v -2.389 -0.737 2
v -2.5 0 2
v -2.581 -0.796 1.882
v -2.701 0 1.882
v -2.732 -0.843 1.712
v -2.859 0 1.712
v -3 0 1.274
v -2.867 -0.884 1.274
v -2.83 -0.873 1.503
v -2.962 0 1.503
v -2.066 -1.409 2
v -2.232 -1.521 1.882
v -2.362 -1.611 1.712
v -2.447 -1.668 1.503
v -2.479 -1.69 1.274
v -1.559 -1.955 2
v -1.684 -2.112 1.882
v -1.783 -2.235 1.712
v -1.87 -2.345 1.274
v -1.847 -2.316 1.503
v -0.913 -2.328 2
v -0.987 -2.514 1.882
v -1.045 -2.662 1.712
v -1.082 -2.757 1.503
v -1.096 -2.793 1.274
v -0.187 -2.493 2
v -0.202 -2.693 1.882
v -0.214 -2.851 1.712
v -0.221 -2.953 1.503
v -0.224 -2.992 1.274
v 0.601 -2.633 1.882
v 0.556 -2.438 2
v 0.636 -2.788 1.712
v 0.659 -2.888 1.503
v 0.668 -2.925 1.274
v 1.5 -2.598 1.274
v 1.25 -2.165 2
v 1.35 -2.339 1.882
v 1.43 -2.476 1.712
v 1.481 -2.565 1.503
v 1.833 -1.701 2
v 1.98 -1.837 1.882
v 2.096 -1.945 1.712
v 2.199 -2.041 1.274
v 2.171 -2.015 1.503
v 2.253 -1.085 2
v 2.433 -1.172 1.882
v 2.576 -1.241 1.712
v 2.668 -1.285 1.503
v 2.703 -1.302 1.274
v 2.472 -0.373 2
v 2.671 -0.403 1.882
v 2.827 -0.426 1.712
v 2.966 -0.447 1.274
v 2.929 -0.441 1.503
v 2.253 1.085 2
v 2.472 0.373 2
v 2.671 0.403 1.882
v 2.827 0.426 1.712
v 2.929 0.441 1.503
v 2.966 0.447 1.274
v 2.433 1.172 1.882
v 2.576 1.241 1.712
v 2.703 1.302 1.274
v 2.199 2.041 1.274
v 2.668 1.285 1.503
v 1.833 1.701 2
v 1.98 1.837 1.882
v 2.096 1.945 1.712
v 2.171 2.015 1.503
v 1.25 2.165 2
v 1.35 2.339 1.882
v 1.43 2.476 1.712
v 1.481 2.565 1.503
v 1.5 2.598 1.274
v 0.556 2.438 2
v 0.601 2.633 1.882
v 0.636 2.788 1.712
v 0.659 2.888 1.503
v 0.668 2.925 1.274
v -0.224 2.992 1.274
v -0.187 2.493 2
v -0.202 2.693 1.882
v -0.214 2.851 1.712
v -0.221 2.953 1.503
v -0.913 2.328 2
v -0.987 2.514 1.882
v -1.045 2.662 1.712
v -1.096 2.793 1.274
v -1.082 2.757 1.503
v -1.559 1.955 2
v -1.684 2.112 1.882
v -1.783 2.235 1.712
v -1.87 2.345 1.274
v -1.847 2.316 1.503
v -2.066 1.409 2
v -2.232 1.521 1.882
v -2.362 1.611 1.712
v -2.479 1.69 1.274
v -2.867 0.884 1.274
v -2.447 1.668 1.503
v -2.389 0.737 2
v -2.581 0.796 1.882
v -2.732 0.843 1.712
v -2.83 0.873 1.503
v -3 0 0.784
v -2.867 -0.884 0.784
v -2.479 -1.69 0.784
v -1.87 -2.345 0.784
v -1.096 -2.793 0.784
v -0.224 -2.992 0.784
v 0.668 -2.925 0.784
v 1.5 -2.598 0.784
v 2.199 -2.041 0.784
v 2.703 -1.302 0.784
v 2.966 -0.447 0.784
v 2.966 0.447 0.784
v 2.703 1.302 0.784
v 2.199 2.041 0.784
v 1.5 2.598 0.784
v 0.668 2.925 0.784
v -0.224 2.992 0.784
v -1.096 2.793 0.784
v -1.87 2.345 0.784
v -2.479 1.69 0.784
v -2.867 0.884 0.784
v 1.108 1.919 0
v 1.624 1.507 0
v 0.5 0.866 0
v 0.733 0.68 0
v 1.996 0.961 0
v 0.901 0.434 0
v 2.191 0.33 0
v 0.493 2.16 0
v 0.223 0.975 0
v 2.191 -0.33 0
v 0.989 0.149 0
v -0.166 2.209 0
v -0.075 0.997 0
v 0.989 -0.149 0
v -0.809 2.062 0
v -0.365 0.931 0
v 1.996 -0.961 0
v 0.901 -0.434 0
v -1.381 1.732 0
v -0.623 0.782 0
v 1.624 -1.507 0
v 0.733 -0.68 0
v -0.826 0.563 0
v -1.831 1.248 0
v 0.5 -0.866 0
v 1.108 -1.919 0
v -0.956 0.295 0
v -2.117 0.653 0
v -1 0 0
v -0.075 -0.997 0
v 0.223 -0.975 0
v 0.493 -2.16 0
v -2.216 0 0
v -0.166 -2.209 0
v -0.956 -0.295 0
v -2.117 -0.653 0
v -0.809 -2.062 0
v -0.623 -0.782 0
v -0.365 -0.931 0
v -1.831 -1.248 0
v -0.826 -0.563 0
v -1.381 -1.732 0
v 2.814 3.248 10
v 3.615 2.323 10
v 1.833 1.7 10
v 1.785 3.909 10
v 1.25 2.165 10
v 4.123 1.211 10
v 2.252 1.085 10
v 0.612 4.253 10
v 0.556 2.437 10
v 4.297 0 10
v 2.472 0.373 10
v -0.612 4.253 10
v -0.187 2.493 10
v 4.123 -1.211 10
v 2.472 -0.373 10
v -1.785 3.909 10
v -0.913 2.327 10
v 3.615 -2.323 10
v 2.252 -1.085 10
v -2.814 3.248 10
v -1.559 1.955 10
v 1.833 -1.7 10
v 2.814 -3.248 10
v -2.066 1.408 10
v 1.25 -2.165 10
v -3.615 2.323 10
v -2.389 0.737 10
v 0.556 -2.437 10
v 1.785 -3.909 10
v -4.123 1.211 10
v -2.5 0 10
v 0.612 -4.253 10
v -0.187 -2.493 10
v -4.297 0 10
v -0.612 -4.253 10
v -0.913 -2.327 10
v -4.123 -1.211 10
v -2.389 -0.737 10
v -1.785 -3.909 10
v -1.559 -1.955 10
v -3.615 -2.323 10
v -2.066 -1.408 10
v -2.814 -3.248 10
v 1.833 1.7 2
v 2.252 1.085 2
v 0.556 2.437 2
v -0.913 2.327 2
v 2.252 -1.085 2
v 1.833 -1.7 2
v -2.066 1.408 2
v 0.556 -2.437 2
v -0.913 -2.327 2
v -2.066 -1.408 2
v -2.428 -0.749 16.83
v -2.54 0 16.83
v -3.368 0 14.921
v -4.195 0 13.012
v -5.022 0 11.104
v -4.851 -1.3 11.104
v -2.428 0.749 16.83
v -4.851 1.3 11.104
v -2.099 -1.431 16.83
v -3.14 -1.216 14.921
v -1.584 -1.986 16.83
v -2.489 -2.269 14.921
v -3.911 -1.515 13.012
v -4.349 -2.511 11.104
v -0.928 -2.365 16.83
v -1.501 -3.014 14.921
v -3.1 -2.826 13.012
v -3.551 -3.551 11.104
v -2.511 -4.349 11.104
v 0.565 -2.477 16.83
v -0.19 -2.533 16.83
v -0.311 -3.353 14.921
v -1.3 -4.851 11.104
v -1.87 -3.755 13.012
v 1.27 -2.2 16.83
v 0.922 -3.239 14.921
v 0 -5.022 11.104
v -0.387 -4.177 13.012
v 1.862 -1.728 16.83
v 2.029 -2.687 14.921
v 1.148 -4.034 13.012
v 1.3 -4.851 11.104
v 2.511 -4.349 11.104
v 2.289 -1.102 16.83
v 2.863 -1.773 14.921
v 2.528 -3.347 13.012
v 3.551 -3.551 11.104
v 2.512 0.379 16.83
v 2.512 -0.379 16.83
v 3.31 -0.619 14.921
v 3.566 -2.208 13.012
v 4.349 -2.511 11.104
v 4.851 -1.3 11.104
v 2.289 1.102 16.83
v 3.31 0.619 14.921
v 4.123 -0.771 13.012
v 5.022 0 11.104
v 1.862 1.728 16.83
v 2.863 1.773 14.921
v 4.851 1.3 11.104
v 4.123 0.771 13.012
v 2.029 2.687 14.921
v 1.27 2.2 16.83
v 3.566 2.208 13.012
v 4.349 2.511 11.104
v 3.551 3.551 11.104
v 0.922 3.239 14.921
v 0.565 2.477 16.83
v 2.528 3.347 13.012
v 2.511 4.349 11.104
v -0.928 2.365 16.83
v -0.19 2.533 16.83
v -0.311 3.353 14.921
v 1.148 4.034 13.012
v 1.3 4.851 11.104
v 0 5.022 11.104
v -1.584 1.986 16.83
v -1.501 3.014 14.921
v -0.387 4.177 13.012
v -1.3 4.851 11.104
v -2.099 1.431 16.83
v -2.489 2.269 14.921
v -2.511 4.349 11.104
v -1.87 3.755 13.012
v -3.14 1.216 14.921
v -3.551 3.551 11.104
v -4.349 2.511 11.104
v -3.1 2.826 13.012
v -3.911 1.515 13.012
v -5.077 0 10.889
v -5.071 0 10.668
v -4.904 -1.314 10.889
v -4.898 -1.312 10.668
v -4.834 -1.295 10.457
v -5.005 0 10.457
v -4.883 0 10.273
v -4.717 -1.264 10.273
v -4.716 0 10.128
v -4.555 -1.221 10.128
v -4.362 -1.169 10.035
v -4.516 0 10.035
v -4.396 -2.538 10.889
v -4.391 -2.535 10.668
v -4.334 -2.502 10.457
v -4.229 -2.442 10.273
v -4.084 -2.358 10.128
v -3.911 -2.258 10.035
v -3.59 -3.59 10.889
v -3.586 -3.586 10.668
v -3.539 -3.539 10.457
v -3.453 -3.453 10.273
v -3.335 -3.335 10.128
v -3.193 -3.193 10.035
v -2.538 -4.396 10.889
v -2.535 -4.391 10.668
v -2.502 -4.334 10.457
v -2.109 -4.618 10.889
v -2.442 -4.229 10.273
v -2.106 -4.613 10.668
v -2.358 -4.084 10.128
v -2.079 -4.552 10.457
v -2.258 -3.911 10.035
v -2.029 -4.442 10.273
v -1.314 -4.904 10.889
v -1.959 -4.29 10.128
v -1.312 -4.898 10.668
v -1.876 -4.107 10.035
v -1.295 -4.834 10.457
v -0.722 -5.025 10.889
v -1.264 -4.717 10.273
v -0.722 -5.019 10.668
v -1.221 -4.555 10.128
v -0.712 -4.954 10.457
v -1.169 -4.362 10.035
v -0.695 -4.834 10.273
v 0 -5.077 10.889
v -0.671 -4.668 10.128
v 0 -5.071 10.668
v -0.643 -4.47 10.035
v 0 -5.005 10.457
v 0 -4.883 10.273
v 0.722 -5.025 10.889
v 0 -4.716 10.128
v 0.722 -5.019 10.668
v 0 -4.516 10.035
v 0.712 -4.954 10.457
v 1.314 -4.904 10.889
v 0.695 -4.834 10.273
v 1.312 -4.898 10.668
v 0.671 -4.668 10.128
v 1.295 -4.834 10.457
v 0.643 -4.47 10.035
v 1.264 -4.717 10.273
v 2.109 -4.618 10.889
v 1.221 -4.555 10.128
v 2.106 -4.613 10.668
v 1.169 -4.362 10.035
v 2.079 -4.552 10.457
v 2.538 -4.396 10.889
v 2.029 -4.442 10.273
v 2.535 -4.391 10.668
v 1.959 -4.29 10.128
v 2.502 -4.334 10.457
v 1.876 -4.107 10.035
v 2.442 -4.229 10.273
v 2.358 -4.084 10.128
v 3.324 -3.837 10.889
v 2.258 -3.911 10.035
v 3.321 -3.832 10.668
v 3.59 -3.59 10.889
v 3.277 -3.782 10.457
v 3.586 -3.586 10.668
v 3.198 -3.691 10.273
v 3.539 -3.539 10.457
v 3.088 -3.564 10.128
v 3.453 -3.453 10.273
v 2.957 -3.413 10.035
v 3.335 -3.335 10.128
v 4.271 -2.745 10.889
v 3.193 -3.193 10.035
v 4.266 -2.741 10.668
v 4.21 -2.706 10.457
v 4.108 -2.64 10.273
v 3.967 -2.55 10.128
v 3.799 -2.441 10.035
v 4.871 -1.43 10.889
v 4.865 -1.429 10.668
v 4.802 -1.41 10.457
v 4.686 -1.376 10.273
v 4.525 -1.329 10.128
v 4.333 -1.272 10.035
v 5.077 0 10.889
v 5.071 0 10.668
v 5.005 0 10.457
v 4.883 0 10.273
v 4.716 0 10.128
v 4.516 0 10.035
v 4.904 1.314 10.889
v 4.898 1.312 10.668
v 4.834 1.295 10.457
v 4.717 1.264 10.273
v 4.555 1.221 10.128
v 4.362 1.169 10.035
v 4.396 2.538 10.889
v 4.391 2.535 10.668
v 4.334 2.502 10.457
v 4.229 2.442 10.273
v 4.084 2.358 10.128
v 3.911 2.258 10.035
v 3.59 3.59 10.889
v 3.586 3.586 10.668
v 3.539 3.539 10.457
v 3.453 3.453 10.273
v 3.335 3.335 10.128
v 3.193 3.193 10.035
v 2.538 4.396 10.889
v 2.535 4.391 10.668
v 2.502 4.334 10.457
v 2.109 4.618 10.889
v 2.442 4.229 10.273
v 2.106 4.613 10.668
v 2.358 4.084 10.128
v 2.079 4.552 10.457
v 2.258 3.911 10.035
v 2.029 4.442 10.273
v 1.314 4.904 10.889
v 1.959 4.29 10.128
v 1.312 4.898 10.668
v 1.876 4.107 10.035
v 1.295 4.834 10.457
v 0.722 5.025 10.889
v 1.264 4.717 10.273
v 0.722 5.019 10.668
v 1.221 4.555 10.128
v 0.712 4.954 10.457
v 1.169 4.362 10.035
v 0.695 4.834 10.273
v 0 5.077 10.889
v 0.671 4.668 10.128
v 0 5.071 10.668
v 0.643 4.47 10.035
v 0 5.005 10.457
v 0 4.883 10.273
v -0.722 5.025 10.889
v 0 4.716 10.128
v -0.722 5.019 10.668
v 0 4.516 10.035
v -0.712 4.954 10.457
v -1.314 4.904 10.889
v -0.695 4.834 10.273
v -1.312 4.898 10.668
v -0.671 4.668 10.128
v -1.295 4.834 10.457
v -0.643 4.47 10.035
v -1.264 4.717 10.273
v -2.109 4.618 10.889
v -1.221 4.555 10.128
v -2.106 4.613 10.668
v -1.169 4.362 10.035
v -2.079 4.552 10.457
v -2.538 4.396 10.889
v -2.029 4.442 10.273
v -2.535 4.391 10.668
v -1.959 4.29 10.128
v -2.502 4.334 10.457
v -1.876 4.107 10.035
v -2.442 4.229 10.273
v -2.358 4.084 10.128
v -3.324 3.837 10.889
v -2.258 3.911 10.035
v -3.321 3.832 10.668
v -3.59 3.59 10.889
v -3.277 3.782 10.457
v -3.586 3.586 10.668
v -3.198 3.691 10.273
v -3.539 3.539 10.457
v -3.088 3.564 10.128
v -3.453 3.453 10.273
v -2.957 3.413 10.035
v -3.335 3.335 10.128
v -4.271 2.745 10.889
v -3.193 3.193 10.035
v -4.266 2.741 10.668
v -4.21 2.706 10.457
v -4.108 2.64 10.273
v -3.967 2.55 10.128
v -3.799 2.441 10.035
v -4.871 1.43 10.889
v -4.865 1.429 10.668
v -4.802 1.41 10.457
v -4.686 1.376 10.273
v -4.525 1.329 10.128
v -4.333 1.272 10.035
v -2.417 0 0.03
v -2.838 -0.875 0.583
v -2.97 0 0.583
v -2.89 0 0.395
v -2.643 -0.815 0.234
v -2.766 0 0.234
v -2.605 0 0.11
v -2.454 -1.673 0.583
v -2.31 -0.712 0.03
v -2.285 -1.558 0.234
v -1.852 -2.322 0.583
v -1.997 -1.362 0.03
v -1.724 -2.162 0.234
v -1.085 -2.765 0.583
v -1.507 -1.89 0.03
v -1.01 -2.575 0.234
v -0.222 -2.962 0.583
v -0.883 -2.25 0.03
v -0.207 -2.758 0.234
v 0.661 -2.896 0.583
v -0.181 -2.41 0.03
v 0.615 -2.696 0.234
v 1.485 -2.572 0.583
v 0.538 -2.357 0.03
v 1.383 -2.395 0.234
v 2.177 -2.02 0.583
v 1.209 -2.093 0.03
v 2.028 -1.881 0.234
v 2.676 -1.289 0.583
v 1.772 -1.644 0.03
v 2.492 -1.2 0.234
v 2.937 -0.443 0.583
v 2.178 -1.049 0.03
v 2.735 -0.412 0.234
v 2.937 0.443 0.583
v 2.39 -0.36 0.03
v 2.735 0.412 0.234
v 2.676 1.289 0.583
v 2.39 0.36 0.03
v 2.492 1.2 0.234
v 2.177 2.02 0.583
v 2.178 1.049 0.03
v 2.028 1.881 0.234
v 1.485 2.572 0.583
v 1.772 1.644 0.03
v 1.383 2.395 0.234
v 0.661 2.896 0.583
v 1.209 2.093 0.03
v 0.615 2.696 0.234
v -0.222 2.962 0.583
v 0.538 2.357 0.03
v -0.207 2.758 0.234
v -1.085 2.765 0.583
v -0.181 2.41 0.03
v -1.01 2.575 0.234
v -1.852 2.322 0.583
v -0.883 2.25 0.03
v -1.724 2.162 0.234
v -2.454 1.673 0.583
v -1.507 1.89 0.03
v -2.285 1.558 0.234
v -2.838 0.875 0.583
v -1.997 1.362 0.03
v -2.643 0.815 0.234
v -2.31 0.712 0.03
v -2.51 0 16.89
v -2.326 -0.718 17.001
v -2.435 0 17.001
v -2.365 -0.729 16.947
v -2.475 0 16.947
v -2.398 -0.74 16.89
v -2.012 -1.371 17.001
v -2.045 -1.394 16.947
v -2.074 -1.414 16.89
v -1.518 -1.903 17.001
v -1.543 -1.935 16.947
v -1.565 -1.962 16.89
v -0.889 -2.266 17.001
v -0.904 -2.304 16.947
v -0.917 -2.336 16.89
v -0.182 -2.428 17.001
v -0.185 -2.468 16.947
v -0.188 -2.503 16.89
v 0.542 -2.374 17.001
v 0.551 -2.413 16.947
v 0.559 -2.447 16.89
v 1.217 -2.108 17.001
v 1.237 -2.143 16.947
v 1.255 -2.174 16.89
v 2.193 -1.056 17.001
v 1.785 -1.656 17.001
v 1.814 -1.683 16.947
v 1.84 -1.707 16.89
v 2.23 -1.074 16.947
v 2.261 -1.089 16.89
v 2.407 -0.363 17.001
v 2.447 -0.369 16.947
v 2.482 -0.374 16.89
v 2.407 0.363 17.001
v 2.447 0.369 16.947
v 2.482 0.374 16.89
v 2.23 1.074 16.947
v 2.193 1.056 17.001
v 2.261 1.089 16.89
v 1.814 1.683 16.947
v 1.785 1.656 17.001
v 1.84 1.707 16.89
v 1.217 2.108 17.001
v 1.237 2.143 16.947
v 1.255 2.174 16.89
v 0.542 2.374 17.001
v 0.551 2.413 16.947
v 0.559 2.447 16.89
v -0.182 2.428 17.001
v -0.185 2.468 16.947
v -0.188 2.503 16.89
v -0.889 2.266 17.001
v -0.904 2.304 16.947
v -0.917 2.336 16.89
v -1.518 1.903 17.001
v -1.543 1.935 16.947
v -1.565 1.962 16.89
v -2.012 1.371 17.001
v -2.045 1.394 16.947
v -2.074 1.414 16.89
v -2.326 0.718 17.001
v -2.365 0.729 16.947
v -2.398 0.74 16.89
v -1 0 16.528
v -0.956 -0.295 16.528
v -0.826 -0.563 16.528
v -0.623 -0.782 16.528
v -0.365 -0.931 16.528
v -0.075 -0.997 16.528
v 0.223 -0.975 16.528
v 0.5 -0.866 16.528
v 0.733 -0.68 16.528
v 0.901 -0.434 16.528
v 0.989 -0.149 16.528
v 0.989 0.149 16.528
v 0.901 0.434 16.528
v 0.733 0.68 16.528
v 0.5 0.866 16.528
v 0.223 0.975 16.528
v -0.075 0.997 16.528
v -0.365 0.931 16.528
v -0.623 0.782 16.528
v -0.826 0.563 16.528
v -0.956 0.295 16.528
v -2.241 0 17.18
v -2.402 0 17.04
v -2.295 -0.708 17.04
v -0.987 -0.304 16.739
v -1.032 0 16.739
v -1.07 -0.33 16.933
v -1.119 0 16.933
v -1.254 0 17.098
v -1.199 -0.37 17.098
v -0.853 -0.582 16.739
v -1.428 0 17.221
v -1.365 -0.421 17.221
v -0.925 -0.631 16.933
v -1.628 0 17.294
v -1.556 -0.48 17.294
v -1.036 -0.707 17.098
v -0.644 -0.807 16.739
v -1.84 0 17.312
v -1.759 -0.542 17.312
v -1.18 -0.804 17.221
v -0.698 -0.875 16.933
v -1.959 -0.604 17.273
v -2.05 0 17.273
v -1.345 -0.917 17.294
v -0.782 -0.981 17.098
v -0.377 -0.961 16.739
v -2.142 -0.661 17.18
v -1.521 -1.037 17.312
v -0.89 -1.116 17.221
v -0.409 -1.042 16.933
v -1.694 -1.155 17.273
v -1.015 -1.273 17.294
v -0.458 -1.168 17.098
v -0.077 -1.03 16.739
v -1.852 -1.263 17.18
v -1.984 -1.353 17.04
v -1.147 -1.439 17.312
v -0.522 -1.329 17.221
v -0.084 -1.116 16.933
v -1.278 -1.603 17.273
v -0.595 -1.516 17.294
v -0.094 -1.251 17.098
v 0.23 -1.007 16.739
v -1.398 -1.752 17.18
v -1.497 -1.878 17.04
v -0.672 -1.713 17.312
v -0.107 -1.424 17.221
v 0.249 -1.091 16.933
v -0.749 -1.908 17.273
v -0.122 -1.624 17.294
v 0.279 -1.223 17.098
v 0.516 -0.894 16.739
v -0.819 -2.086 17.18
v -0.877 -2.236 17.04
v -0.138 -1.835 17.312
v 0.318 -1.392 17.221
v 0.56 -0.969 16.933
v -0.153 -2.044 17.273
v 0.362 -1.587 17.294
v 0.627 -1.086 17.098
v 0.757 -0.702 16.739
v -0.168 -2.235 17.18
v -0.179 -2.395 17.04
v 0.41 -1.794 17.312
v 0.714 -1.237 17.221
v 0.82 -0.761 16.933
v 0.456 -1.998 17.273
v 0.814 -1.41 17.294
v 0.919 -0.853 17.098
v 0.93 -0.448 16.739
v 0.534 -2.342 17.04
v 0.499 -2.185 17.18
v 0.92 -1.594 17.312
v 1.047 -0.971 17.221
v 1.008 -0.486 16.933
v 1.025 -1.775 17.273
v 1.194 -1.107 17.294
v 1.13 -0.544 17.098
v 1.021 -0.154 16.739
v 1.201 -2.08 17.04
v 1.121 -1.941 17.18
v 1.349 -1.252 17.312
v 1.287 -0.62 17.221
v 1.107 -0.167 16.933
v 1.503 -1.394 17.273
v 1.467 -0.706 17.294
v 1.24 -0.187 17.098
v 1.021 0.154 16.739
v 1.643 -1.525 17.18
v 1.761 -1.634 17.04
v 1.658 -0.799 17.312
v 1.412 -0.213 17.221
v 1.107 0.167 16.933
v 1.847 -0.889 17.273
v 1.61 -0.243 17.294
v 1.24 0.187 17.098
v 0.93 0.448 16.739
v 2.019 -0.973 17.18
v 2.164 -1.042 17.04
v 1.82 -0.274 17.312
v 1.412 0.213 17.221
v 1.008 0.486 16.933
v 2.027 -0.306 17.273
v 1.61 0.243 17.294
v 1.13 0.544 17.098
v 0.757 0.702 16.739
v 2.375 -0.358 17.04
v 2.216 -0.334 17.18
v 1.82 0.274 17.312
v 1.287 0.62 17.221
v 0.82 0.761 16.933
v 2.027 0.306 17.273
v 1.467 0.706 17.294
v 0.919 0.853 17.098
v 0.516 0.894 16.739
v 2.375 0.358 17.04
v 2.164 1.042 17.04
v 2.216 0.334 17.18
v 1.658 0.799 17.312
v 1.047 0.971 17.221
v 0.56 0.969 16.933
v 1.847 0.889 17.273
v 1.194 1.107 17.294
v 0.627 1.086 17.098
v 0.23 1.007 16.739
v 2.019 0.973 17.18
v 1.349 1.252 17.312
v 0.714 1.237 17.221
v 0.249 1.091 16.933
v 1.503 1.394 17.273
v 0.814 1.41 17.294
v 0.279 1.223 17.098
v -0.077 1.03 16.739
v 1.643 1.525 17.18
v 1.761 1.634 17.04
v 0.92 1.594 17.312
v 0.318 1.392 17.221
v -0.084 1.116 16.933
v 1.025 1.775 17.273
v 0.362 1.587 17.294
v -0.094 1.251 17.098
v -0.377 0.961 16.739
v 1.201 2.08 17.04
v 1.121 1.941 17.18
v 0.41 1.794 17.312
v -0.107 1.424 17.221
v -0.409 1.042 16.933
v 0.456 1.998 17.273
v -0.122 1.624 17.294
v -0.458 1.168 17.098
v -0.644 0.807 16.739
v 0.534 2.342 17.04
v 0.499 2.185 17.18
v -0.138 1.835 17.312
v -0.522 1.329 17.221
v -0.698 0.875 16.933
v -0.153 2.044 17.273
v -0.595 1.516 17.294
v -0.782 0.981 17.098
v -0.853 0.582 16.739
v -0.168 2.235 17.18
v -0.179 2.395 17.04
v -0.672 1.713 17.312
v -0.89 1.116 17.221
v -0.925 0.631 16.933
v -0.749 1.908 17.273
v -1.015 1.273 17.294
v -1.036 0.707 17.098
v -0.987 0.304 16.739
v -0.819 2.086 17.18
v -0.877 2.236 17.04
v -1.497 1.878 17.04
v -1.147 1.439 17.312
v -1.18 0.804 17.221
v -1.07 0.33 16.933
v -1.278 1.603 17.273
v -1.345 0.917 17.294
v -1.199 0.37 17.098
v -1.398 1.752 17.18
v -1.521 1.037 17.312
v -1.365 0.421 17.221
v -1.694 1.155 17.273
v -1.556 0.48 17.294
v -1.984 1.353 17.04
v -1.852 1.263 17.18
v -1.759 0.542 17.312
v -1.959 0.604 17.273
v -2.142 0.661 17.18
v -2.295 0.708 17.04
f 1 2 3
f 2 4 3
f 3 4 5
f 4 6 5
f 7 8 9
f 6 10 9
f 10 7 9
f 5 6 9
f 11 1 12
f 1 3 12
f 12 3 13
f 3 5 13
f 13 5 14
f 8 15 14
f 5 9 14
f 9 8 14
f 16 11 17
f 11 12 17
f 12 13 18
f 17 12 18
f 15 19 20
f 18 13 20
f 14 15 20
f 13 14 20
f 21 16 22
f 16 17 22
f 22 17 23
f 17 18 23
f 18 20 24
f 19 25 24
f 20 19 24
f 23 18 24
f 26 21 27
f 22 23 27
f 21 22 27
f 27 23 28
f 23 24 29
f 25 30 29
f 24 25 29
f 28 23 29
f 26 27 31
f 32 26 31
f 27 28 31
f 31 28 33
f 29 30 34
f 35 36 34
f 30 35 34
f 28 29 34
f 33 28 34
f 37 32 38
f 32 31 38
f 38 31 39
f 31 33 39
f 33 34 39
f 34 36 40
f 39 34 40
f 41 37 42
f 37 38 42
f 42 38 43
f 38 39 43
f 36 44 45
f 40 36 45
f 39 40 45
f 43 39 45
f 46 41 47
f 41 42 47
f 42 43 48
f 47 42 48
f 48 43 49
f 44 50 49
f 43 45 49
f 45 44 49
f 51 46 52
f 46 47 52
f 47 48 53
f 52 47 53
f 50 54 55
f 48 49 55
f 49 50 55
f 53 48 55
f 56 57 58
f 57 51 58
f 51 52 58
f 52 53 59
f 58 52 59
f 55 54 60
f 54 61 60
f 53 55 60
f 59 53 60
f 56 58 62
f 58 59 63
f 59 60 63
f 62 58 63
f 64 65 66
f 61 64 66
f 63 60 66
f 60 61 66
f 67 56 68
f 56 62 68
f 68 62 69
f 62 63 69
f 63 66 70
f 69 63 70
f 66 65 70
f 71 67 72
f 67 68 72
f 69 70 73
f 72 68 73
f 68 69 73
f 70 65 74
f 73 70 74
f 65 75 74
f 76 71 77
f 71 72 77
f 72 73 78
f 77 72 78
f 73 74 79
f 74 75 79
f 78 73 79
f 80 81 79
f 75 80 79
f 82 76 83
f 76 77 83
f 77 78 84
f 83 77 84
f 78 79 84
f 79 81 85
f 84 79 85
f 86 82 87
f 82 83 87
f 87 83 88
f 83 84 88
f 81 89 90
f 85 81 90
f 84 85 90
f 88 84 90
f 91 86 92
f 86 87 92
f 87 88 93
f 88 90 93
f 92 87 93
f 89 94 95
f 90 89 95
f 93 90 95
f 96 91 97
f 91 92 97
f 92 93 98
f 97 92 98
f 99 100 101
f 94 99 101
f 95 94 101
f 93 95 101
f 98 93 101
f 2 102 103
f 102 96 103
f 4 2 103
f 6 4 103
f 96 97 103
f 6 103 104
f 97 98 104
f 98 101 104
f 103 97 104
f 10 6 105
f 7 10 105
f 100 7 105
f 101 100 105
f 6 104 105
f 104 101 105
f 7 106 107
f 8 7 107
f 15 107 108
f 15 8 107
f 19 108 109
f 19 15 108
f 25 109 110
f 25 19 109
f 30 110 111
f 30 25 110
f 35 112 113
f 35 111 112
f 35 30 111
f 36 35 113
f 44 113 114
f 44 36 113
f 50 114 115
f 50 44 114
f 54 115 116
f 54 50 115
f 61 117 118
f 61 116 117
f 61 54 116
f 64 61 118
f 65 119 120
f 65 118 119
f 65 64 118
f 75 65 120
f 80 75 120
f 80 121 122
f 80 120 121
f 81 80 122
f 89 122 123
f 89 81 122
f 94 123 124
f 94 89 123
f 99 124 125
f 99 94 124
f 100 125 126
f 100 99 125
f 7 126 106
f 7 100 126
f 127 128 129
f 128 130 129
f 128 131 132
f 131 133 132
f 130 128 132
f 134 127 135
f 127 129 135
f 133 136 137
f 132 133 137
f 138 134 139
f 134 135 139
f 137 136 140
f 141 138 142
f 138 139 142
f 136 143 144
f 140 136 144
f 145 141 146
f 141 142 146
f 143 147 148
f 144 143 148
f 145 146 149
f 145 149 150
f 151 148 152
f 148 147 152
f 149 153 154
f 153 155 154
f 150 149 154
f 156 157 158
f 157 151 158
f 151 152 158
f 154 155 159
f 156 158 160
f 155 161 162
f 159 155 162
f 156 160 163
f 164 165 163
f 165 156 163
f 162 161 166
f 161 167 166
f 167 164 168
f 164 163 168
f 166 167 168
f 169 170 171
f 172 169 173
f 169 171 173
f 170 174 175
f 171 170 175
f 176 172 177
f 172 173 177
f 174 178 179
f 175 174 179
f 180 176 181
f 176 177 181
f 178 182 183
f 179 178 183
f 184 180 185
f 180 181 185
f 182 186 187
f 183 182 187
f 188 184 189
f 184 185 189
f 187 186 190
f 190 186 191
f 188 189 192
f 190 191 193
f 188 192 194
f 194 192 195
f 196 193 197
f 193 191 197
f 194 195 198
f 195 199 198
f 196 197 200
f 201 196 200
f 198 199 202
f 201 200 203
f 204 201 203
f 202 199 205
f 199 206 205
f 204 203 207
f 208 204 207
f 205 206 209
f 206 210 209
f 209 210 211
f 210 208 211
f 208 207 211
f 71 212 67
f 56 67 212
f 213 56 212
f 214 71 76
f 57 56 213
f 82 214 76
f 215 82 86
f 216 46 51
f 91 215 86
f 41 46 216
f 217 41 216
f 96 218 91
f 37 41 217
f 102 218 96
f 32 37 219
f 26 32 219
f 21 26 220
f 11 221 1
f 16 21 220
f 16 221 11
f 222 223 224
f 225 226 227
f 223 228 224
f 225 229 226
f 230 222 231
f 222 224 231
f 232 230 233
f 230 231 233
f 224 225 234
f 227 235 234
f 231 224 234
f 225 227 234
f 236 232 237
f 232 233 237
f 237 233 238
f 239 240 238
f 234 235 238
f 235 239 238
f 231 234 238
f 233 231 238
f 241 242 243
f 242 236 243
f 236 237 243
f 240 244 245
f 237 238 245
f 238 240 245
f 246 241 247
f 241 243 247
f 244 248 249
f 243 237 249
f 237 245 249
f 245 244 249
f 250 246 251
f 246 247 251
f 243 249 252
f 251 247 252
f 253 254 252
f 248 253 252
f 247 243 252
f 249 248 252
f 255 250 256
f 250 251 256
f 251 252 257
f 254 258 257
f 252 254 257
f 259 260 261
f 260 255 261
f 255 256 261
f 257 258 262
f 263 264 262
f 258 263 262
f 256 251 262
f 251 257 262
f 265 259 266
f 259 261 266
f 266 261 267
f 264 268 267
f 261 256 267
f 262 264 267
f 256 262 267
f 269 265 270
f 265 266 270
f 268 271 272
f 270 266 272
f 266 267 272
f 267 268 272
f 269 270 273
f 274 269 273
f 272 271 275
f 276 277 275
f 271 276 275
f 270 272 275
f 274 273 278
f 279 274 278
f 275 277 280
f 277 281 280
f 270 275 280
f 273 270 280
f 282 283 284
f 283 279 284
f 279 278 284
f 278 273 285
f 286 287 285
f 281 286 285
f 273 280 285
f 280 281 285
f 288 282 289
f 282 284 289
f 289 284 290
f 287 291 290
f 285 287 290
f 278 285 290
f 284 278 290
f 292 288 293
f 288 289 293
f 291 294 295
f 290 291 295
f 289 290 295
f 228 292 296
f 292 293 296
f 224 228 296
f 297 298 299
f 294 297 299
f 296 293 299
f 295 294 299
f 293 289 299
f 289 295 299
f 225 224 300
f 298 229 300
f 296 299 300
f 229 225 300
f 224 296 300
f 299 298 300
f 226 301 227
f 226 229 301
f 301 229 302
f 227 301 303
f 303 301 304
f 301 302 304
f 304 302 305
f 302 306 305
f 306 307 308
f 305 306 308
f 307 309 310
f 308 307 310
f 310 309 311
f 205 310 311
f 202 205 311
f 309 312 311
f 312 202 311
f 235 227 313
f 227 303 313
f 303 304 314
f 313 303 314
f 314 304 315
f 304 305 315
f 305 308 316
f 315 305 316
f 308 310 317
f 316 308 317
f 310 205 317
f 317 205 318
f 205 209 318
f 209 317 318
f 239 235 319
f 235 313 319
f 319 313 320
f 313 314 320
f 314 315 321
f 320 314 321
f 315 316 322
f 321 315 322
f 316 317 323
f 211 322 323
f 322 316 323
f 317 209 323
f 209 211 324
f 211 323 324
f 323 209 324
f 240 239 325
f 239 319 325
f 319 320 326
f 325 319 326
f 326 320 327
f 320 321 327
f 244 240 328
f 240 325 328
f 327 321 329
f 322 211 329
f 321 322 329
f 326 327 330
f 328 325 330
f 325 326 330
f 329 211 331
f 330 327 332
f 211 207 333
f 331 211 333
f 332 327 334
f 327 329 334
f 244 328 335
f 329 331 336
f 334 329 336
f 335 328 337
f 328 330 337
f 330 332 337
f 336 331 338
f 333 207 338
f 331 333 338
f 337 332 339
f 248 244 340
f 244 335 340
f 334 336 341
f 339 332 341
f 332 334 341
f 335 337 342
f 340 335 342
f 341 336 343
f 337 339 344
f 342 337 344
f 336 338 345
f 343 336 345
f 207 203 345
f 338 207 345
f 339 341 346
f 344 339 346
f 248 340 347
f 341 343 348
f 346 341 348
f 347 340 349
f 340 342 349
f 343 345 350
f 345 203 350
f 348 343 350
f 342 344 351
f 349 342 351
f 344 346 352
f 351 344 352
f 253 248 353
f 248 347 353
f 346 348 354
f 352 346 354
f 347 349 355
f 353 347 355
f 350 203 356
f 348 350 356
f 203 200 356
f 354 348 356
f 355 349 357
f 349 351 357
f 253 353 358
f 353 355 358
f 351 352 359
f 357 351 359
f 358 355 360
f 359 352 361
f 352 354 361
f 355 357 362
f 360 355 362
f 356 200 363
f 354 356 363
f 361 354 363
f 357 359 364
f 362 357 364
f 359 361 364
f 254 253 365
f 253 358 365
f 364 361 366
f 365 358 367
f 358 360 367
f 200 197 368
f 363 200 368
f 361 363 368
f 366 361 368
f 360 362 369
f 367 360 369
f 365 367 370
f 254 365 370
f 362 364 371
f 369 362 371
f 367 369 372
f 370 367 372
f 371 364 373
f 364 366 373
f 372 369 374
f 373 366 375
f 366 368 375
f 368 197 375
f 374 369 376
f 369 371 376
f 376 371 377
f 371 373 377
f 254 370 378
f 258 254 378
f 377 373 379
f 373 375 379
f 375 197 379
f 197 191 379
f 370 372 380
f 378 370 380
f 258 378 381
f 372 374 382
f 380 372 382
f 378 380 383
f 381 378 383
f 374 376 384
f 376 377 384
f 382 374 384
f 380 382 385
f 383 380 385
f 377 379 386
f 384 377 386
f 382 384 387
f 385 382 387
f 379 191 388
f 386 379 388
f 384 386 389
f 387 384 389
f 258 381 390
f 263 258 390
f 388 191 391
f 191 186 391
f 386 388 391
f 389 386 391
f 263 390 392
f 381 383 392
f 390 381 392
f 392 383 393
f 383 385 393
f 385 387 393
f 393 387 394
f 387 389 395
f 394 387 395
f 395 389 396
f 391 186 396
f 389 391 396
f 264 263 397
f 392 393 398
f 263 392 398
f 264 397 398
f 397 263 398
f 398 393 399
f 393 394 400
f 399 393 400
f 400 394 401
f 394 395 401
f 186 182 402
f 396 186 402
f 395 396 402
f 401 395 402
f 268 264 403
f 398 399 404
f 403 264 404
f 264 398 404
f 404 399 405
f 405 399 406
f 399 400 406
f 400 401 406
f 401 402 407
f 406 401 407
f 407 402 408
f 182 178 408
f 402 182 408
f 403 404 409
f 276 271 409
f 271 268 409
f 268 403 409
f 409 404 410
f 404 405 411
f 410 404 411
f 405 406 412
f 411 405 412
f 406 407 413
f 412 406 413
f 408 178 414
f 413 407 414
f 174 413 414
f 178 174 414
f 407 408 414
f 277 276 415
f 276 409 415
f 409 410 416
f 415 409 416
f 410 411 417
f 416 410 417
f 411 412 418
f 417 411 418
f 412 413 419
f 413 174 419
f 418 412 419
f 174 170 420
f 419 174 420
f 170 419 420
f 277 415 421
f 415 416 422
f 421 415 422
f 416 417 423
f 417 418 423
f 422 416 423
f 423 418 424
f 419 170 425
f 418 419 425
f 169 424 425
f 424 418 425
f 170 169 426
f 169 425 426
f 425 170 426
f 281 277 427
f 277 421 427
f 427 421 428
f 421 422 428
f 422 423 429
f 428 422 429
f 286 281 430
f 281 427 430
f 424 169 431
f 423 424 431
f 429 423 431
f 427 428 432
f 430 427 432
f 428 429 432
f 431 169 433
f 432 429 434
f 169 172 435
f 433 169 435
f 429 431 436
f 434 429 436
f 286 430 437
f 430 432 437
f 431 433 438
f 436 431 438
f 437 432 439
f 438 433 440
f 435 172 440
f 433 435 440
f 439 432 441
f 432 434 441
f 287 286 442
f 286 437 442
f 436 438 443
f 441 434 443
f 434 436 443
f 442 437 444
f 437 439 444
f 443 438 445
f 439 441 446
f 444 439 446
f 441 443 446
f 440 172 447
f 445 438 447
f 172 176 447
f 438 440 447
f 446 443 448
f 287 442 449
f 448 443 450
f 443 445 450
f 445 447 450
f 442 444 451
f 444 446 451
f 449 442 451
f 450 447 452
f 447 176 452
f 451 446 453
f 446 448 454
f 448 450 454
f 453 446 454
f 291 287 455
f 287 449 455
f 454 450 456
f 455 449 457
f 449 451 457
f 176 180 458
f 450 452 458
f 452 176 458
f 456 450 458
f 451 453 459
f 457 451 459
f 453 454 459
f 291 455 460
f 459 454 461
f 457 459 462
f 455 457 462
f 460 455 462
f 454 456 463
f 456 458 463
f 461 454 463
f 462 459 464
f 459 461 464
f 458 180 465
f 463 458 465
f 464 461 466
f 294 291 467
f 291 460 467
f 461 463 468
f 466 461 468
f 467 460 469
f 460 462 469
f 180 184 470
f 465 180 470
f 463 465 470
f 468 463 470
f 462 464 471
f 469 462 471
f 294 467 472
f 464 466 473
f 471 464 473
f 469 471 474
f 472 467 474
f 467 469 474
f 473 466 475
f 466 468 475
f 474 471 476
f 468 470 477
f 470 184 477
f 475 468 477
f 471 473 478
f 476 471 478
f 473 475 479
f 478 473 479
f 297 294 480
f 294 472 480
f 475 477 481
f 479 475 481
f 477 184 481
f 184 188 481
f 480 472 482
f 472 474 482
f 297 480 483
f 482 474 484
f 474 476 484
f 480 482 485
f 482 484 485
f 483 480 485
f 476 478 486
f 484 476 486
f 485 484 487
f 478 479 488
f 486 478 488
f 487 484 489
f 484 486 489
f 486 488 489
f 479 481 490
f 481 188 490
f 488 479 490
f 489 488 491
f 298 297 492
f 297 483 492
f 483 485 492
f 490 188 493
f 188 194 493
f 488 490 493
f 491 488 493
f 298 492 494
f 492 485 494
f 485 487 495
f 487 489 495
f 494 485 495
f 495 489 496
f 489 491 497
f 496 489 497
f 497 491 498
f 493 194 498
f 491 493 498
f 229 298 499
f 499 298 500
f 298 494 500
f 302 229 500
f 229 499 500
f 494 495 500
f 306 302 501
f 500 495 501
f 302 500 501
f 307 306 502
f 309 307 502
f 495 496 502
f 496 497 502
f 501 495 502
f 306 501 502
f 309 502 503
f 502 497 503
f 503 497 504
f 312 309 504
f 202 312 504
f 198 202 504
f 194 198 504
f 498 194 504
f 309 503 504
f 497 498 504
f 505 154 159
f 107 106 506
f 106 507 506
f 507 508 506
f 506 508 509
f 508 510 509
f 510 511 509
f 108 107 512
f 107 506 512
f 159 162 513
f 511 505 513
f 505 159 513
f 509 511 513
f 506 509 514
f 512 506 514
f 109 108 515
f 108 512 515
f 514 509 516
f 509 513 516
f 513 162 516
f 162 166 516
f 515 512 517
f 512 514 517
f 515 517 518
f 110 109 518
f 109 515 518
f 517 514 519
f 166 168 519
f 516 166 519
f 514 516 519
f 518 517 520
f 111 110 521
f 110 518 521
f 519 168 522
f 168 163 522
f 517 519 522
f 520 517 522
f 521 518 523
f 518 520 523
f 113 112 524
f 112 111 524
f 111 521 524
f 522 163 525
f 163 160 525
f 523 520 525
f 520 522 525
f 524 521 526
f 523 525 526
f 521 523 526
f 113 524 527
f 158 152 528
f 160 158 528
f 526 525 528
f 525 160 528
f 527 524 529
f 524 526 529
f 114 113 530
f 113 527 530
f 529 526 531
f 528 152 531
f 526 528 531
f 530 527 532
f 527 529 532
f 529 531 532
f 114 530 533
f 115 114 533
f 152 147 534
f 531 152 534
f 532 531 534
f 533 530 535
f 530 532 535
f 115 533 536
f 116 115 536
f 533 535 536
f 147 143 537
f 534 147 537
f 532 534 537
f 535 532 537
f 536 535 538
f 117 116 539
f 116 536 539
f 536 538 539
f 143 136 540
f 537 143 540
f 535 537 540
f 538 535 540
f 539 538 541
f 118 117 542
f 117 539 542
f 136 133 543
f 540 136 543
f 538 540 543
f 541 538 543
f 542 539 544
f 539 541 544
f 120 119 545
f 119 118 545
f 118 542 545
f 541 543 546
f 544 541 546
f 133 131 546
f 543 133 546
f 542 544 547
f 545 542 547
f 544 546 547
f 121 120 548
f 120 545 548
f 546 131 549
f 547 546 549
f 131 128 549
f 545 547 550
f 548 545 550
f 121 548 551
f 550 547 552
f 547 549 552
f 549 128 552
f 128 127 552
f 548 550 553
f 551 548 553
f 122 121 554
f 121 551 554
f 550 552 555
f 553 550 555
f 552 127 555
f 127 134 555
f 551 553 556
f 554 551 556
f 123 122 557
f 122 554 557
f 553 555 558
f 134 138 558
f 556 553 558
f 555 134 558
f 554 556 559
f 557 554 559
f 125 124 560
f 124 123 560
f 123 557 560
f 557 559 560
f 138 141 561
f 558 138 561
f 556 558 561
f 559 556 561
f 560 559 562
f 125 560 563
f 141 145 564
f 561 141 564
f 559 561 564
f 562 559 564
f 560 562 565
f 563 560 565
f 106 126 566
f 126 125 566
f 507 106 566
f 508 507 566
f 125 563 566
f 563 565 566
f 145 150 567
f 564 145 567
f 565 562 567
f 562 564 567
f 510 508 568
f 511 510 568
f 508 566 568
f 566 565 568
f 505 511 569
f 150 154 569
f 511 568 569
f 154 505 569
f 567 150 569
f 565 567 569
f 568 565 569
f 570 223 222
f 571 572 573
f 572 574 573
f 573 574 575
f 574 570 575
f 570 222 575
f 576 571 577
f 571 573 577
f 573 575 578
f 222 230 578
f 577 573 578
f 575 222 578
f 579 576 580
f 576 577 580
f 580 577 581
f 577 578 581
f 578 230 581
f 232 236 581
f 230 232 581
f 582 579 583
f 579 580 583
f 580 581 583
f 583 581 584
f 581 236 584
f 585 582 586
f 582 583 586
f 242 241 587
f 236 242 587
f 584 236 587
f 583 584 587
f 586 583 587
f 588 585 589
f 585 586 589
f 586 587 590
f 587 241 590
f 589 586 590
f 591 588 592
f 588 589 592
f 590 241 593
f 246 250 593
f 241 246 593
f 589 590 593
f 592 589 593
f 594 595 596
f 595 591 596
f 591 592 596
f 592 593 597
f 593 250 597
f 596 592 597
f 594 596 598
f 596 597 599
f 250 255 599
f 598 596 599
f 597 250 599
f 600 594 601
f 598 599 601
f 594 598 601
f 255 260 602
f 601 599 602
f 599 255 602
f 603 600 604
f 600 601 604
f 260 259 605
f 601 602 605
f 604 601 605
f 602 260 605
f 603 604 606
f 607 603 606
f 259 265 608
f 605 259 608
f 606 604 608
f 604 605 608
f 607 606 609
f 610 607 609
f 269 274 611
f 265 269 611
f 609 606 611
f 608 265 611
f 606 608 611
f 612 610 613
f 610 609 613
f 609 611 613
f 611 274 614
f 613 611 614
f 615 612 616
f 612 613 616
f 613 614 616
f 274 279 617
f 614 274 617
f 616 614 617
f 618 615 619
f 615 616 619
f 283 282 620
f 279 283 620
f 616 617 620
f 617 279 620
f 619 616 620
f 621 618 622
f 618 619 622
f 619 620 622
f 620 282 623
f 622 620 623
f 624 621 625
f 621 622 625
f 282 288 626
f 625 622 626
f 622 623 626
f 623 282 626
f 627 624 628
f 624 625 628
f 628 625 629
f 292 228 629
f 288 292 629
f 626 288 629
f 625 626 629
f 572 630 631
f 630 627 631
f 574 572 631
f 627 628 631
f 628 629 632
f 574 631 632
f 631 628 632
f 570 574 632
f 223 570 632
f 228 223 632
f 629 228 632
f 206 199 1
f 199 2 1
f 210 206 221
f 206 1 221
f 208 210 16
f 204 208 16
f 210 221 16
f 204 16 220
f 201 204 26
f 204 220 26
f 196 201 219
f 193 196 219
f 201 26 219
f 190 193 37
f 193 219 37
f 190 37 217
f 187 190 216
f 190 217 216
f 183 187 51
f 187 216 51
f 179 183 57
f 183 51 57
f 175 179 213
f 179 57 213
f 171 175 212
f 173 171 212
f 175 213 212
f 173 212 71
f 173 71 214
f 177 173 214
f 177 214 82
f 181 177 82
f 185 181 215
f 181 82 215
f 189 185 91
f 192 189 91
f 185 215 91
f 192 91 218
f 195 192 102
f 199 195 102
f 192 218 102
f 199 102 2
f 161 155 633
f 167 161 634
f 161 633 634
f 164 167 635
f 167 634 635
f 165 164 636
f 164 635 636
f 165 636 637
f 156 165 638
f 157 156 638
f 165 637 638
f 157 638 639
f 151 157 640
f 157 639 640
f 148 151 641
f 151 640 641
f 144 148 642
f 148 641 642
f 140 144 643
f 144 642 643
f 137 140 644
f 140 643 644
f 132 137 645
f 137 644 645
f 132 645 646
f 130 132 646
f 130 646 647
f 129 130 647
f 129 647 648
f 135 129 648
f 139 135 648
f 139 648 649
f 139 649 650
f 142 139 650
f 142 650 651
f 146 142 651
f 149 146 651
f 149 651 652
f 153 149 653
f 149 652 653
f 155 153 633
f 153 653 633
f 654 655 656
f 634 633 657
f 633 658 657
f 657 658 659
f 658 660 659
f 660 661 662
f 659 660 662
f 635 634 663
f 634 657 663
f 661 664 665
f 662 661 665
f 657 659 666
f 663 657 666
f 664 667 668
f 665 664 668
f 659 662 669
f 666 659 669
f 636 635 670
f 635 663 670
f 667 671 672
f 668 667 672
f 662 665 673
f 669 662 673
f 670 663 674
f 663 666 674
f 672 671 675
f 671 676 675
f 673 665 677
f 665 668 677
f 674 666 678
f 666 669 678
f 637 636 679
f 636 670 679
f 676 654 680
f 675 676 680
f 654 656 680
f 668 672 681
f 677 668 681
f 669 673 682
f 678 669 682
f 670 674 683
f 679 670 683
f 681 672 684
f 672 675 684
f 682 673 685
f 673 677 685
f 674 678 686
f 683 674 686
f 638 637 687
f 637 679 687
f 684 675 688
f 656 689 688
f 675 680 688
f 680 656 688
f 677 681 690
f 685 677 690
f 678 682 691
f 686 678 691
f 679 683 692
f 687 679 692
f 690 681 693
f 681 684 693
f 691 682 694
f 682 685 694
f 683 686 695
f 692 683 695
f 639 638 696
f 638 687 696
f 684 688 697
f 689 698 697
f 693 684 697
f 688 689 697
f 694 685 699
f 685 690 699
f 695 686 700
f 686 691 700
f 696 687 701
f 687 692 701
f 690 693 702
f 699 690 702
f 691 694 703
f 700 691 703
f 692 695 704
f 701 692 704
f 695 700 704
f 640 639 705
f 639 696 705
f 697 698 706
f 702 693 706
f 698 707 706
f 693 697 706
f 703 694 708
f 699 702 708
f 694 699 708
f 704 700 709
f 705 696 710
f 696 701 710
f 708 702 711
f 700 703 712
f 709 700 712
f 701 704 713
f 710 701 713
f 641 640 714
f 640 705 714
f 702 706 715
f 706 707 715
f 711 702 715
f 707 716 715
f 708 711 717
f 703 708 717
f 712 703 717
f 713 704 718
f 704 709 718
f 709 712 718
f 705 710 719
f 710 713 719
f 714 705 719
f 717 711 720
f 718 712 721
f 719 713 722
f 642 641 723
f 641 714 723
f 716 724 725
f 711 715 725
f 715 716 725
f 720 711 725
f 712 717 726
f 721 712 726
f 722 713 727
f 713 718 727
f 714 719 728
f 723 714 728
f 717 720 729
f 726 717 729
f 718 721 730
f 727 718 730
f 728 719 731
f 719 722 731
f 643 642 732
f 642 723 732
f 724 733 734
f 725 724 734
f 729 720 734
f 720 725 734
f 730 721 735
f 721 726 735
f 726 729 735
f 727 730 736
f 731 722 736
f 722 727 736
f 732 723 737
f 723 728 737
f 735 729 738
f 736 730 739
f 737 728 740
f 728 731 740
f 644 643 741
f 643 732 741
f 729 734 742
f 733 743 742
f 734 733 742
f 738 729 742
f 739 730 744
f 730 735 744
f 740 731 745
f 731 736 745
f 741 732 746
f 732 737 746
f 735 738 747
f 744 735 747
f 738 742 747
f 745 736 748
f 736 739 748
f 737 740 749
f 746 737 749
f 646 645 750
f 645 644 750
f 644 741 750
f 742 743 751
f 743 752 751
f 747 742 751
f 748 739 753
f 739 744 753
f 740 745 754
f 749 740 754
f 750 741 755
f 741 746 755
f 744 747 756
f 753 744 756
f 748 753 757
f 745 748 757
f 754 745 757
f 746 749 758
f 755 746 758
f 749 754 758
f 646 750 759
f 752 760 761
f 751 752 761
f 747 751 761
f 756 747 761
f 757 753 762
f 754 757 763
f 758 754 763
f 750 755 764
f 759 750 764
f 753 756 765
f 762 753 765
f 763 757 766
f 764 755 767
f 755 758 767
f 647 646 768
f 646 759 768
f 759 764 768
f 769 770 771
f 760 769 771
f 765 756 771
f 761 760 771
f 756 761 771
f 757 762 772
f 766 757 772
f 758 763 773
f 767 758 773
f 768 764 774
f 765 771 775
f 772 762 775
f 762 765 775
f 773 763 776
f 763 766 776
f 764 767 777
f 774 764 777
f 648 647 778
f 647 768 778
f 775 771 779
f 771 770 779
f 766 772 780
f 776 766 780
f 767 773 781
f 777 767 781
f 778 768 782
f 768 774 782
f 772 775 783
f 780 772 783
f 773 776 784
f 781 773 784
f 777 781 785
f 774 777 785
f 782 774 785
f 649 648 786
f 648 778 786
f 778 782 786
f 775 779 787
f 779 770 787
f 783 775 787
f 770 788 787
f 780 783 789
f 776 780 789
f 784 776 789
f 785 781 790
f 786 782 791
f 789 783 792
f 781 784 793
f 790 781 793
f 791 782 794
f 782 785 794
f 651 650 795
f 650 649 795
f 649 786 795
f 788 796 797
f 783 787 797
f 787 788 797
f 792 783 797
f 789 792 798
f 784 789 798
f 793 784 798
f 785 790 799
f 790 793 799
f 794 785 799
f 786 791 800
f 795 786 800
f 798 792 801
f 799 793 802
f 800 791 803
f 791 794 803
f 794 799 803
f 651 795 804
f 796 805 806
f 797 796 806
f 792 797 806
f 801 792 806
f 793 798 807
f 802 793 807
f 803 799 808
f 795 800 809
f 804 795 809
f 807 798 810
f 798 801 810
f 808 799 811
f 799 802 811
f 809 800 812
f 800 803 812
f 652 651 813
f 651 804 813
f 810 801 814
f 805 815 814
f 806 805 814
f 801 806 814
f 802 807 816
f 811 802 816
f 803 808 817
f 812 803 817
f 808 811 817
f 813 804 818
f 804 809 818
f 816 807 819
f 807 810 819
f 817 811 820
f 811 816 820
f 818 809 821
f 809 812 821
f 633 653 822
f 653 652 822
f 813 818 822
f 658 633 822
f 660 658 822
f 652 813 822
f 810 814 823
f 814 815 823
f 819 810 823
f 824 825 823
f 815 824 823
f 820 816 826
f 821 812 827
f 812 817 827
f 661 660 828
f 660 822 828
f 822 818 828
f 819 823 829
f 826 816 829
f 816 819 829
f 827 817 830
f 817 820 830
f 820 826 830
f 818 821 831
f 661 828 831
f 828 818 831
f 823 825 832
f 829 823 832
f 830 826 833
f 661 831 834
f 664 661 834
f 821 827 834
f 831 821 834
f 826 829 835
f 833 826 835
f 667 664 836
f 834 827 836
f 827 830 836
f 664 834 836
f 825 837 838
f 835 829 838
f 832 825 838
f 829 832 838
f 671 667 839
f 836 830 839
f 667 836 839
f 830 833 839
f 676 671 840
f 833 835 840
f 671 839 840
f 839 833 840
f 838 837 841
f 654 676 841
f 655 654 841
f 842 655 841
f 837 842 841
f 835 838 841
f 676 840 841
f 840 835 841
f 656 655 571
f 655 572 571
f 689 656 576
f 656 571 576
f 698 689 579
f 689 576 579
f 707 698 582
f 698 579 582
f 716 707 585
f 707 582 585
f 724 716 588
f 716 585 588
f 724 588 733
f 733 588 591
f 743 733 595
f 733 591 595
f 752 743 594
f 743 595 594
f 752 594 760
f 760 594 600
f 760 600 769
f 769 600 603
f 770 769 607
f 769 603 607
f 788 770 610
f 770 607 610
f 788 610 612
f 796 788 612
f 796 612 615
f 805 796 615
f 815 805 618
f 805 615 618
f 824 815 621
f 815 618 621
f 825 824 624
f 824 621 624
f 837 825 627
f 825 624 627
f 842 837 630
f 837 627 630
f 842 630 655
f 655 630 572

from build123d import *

# Parameters (mm, degrees)
F0_W = 0.5
F0_H = 2


# Not quite as in the source:
# - a fillet or chamfer that OpenCascade refuses, or shapes differently, is made with other operations: its cross-section is extruded or revolved along the edge and cut away or added


with BuildPart() as f1:
    # F0 (on Front) → F1 (revolve)
    with BuildSketch(Plane.XZ):
        Polygon((-2.5, 0), (-1, 0), (-1, 18.7049116939), (-2.5, 16.9229302555), (-5.5, 10), (-2.5, 10), (-2.5, 2), align=None)
        with Locations((-2.75, 1)):
            Rectangle(F0_W, F0_H)
    revolve(axis=Axis((0, 0, 13.3904740214), (0, 0, 1)))

    # F2: fillet of radius 0.8 on 5 edges, made by hand

    # F2_s1 → F2_t2 (revolve, cut)
    with BuildSketch(Plane.XZ):
        with BuildLine():
            ThreePointArc((-2.424695214, 17.0126243355), (-2.4928760132, 16.918520212), (-2.546704077, 16.8155311495))
            Line((-2.546704077, 16.8155311495), (-2.5613849178, 16.821892982))
            ThreePointArc((-2.5613849178, 16.821892982), (-2.5379640629, 16.8755627139), (-2.5146808408, 16.929292088))
            Line((-2.5146808408, 16.929292088), (-2.5122406636, 16.9332339517))
            ThreePointArc((-2.5122406636, 16.9332339517), (-2.4745308925, 16.9780326932), (-2.4369358776, 17.0229280317))
            Line((-2.4369358776, 17.0229280317), (-2.424695214, 17.0126243355))
        make_face()
    revolve(axis=Axis((0, 0, 16.9229302555), (0, 0, 1)), mode=Mode.SUBTRACT)

    # F2_s3 → F2_t4 (revolve, cut)
    with BuildSketch(Plane.XZ):
        with BuildLine():
            ThreePointArc((-5.0157118449, 11.1179416236), (-4.9504273448, 10.3608017674), (-4.2816698032, 9.99985))
            Line((-4.2816698032, 9.99985), (-4.2816698032, 9.98385))
            ThreePointArc((-4.2816698032, 9.98385), (-4.8908349016, 9.984), (-5.5, 9.984))
            Line((-5.5, 9.984), (-5.5146808408, 10.0063618325))
            ThreePointArc((-5.5146808408, 10.0063618325), (-5.2724679468, 10.5653028232), (-5.0303926857, 11.1243034561))
            Line((-5.0303926857, 11.1243034561), (-5.0157118449, 11.1179416236))
        make_face()
    revolve(axis=Axis((0, 0, 10), (0, 0, 1)), mode=Mode.SUBTRACT)

    # F2_s5 → F2_t6 (revolve, cut)
    with BuildSketch(Plane.XZ):
        with BuildLine():
            ThreePointArc((-0.99985, 16.5126600652), (-1.5256480152, 17.2642006639), (-2.4118831788, 17.0278448749))
            Line((-2.4118831788, 17.0278448749), (-2.4241238423, 17.0381485711))
            ThreePointArc((-2.4241238423, 17.0381485711), (-1.7181248748, 17.876633682), (-1.0122406636, 18.7152153901))
            Line((-1.0122406636, 18.7152153901), (-0.984, 18.7049116939))
            ThreePointArc((-0.984, 18.7049116939), (-0.984, 17.6087858796), (-0.98385, 16.5126600652))
            Line((-0.98385, 16.5126600652), (-0.99985, 16.5126600652))
        make_face()
    revolve(axis=Axis((0, 0, 18.7049116939), (0, 0, 1)), mode=Mode.SUBTRACT)

    # F2_s7 → F2_t8 (revolve, cut)
    with BuildSketch(Plane.XZ):
        with BuildLine():
            ThreePointArc((-2.5000562324, 2.0001390608), (-2.8634466855, 1.7057368158), (-3.00015, 1.2584812882))
            Line((-3.00015, 1.2584812882), (-3.01615, 1.2584812882))
            ThreePointArc((-3.01615, 1.2584812882), (-3.016, 1.6292406441), (-3.016, 2))
            Line((-3.016, 2), (-3, 2.016))
            ThreePointArc((-3, 2.016), (-2.7500281162, 2.016), (-2.5060543571, 2.0149722163))
            Line((-2.5060543571, 2.0149722163), (-2.5000562324, 2.0001390608))
        make_face()
    revolve(axis=Axis((0, 0, 2), (0, 0, 1)), mode=Mode.SUBTRACT)

    # F2_s9 → F2_t10 (revolve, cut)
    with BuildSketch(Plane.XZ):
        with BuildLine():
            ThreePointArc((-3.00015, 0.79985), (-2.7658354249, 0.2341645751), (-2.20015, -0.00015))
            Line((-2.20015, -0.00015), (-2.20015, -0.01615))
            ThreePointArc((-2.20015, -0.01615), (-2.600075, -0.016), (-3, -0.016))
            Line((-3, -0.016), (-3.016, 0))
            ThreePointArc((-3.016, 0), (-3.016, 0.399925), (-3.01615, 0.79985))
            Line((-3.01615, 0.79985), (-3.00015, 0.79985))
        make_face()
    revolve(axis=Axis((0, 0, 0), (0, 0, 1)), mode=Mode.SUBTRACT)


solid = f1.part
